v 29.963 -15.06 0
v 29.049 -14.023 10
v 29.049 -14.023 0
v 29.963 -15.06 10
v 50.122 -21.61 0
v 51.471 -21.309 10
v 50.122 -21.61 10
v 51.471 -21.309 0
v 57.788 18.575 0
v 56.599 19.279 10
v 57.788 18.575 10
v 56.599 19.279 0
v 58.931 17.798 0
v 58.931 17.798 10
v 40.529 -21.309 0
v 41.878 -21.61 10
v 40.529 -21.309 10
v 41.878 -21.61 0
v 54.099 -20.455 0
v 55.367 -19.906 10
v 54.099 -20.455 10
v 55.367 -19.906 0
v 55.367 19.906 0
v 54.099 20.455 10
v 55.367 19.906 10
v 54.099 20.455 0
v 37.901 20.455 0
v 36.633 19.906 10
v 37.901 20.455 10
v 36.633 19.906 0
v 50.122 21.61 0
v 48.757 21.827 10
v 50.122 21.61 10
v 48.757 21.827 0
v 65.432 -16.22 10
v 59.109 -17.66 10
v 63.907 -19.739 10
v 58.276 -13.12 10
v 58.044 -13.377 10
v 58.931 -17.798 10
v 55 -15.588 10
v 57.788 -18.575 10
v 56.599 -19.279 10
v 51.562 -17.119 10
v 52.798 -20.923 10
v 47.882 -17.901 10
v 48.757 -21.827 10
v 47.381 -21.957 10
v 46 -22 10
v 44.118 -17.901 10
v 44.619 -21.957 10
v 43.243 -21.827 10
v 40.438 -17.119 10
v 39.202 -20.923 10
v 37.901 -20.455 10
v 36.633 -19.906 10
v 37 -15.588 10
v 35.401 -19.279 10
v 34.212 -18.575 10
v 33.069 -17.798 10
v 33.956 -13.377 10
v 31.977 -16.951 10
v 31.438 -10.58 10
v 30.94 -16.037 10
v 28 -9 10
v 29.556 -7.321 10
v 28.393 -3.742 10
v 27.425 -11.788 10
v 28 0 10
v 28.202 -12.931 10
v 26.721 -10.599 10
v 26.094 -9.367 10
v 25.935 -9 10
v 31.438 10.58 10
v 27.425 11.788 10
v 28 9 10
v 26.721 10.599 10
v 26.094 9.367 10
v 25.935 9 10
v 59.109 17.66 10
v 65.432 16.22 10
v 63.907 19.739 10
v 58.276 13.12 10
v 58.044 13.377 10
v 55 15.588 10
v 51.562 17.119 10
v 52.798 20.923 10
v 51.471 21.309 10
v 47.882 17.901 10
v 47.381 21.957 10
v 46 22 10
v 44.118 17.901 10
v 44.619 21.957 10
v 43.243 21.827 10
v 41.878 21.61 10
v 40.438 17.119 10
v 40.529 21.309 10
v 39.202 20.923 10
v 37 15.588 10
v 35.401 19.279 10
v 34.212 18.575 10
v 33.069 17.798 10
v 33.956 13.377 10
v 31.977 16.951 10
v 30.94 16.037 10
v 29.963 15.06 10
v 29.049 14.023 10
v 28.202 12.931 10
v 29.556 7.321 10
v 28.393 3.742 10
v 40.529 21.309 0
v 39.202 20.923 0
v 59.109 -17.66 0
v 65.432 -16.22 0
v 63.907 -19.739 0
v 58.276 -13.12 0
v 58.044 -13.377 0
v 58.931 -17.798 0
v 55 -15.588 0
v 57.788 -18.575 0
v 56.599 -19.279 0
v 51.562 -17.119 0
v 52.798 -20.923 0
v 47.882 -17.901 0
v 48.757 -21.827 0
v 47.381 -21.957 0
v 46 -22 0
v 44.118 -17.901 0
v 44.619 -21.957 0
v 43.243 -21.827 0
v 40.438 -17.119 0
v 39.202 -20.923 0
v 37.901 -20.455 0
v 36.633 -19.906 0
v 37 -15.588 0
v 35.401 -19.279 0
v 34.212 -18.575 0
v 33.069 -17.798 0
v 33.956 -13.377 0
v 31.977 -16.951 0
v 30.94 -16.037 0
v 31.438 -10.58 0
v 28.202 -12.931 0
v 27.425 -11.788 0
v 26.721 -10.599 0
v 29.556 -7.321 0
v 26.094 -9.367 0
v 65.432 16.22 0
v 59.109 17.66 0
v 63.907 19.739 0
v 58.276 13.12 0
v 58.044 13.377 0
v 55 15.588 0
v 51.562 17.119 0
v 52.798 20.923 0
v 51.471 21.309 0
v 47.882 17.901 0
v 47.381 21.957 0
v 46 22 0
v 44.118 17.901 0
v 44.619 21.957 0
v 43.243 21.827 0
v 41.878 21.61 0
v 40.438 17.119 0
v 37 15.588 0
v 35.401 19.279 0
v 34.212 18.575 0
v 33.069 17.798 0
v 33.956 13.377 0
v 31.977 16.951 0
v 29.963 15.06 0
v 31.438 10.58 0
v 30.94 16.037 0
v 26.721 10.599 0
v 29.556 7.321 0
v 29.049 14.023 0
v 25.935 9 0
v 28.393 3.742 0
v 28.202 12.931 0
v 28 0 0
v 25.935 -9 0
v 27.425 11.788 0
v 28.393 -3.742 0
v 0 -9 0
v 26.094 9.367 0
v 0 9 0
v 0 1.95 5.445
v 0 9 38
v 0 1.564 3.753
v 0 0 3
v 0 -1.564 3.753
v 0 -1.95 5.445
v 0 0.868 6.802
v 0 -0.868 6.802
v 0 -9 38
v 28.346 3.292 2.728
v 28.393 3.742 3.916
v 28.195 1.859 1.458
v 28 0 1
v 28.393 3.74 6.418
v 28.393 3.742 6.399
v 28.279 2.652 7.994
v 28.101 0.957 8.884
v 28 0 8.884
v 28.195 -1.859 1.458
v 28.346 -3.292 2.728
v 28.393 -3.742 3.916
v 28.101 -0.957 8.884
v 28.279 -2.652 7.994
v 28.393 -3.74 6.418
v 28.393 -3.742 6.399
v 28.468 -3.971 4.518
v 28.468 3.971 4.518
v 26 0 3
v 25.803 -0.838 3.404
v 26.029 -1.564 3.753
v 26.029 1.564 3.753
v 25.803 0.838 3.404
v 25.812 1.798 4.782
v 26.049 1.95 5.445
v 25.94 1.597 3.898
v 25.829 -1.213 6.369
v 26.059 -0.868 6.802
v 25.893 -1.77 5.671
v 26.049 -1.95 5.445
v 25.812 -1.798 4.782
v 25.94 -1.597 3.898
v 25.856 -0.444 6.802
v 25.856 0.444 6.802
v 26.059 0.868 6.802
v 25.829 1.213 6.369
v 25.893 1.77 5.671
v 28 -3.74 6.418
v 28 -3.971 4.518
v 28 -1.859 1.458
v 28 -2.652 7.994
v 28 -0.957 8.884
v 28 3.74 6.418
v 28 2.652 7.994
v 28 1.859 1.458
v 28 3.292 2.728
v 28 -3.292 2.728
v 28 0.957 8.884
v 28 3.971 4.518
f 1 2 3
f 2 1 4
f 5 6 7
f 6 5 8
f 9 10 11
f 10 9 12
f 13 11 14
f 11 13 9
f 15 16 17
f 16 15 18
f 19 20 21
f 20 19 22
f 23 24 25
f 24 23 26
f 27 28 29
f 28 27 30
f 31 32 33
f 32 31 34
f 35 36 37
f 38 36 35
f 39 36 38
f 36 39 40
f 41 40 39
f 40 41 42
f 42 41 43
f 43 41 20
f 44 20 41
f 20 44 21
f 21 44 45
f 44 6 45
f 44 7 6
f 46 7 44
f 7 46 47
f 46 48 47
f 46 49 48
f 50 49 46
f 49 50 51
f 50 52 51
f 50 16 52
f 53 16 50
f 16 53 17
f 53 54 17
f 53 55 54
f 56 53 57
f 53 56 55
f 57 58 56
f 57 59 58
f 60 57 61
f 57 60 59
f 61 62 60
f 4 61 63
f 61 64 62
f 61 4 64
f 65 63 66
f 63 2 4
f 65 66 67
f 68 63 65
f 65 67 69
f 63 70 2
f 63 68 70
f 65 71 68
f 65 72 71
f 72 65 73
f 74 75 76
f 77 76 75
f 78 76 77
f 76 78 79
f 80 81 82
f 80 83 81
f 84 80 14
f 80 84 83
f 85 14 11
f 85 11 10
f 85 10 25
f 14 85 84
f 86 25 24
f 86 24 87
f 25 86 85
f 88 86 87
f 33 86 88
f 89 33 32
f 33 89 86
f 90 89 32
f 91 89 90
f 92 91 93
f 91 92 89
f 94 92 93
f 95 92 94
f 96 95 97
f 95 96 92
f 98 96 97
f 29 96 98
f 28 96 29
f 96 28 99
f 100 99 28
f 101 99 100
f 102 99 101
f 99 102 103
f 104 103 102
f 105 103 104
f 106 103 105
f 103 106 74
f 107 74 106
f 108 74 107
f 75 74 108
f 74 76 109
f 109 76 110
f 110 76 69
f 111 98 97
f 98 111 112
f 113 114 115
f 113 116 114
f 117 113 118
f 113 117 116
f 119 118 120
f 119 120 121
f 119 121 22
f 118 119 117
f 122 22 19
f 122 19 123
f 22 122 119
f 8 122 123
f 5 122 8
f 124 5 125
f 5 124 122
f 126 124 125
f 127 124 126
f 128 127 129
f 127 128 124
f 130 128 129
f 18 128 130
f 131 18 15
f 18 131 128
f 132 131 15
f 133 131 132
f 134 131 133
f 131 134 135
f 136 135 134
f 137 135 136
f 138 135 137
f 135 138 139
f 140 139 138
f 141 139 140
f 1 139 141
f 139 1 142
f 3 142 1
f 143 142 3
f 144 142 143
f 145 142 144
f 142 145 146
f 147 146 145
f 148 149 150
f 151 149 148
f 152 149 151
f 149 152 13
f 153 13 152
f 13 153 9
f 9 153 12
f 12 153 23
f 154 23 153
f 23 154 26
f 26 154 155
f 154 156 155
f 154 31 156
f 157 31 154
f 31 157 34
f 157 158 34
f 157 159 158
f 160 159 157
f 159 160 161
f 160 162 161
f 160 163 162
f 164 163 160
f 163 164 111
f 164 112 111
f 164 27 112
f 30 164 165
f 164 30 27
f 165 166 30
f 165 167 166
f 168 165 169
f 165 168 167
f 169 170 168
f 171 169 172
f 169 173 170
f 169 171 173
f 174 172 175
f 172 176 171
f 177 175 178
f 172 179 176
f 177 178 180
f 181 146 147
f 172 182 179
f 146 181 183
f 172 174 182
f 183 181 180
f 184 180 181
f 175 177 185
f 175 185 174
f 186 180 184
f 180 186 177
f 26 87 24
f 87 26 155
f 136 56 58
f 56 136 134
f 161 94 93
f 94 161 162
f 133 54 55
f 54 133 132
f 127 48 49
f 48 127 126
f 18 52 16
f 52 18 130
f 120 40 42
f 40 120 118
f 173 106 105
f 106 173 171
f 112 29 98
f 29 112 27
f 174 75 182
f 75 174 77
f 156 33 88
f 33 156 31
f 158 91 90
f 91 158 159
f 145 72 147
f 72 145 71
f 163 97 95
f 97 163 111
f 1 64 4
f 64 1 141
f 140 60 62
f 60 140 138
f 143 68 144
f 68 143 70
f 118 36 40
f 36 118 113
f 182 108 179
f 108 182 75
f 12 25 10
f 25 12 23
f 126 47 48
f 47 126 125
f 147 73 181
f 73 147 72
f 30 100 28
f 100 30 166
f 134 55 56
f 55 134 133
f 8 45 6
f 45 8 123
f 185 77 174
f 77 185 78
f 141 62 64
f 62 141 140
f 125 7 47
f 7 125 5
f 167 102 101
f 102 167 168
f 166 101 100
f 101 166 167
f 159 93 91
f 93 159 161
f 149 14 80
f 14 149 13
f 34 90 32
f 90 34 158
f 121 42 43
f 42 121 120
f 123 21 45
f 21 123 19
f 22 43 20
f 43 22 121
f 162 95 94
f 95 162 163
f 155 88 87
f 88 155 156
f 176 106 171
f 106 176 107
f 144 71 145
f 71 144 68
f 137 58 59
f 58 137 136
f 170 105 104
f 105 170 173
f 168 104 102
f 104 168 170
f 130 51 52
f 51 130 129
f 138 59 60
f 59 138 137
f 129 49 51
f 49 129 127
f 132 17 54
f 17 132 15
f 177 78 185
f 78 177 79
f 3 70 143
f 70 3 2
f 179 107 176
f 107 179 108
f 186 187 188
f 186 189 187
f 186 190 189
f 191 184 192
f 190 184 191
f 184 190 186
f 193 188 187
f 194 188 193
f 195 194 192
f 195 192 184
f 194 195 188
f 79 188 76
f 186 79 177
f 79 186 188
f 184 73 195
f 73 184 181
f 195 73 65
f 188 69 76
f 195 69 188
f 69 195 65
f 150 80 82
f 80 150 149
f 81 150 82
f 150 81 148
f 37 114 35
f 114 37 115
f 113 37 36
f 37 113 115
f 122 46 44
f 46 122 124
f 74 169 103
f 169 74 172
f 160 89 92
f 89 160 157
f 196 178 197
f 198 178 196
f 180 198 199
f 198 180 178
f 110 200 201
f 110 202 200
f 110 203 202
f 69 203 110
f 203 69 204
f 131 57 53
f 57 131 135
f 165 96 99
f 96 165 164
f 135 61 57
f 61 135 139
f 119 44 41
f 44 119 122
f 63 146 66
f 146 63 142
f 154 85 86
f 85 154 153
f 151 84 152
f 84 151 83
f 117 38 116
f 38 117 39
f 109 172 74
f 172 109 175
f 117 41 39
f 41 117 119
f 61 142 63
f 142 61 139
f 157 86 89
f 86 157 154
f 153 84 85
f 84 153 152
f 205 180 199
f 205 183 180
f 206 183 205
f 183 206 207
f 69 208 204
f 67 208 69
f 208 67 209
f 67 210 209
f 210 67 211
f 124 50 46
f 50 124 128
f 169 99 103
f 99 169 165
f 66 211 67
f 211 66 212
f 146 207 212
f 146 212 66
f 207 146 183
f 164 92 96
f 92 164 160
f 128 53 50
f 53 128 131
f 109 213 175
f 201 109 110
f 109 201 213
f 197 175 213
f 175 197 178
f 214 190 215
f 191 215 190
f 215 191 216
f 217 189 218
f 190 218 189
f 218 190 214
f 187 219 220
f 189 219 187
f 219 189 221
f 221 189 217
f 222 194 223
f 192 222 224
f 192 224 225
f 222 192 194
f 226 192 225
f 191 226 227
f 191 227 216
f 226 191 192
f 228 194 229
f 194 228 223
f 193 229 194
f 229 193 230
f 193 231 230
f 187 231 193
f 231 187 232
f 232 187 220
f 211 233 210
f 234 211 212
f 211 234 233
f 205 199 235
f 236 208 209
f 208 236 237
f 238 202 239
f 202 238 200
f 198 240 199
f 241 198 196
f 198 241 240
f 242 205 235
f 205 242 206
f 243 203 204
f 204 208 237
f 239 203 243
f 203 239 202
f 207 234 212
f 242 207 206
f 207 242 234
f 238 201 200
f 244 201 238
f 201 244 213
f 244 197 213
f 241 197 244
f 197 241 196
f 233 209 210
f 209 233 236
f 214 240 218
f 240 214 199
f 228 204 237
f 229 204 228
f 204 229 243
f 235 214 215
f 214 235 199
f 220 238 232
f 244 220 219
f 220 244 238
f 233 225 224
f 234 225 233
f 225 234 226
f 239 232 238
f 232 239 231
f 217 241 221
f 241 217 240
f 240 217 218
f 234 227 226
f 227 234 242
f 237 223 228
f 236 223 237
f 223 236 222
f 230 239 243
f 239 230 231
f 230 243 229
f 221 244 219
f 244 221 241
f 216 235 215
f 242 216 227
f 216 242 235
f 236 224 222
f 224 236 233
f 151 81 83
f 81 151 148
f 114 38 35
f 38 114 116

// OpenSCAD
holding_tude_diameter=36.;
tube_wall_distance=28.;
thickness=4.;
supported=true;
percent_opening=52.0/60.0;//degree
height=10.0;
screw_radius=2.0;
//internal parameters
screw_head_radius=screw_radius*2;
spacer_width=holding_tude_diameter*0.5;

difference(){
    union(){
   //around the tube
translate([tube_wall_distance+holding_tude_diameter*0.5,0,0])cylinder(h=height,r=holding_tude_diameter*0.5+thickness,$fn=100);
   //Spacer between the wall and the tube
translate([0,-spacer_width*0.5,0])cube([tube_wall_distance+holding_tude_diameter*0.5,
        spacer_width,
        height]);
   //Support for the spacer
polyhedron( points =  [
  [ 0,-spacer_width*0.5,height ],  //0
  [ tube_wall_distance,-spacer_width*0.5,height ],  //1
  [ 0,-spacer_width*0.5,height + tube_wall_distance],  //2
  [ 0,+spacer_width*0.5,height ],  //3
  [ tube_wall_distance,+spacer_width*0.5,height ],  //4
  [ 0,+spacer_width*0.5,height + tube_wall_distance ]], 
  faces =   [
  [0,2,1],  // bottom
  [1,2,5,4],  // front
  [3,4,5],  // top
  [0,1,4,3],  // right
  [2,0,3,5]] // left 
  );
    //opening lip 1
translate([tube_wall_distance,thickness*0.5,0])rotate ([00,00,atan(percent_opening/2)])translate([(holding_tude_diameter+thickness*1)*0.5,0,height*0.5])cube([holding_tude_diameter+thickness*1,
        thickness,
        height],center=true);
    //opening lip 2
translate([tube_wall_distance,-thickness*0.5,0])rotate ([00,00,-atan(percent_opening/2)])translate([(holding_tude_diameter+thickness*1)*0.5,0,height*0.5])cube([holding_tude_diameter+thickness*1,
        thickness,
        height],center=true);
    };
    union(){
//the holde for the tube
    translate([tube_wall_distance+holding_tude_diameter*0.5,0,0])cylinder(h=height,r=holding_tude_diameter*0.5);
//screw hole
    translate([0,0,height*0.5])rotate ([00,90,0])cylinder(h=tube_wall_distance+holding_tude_diameter*0.5,r=screw_radius);
//screw head cylindrical hole
    translate([tube_wall_distance,0,height*0.5])rotate ([00,90,0])cylinder(h=holding_tude_diameter*0.5,r=screw_head_radius);
//screw head conical hole
    translate([tube_wall_distance-screw_head_radius,0,height*0.5])rotate ([00,90,0])cylinder(h=screw_head_radius,r1=0,r2=screw_head_radius);
//the opening for the tube to enter the holder
    polyhedron( points =  [
  [  tube_wall_distance,0,0 ],  //0
  [ tube_wall_distance+holding_tude_diameter+thickness*2,  
  (holding_tude_diameter+thickness*2)*percent_opening/2,  0 ],  //1
  [ tube_wall_distance+holding_tude_diameter+thickness*2,
  -(holding_tude_diameter+thickness*2)*percent_opening/2,  0 ],  //2
  [ tube_wall_distance,0,  height ],  //3
  [ tube_wall_distance+holding_tude_diameter+thickness*2,
  (holding_tude_diameter+thickness*2)*percent_opening/2,  height ],  //4
  [ tube_wall_distance+holding_tude_diameter+thickness*2,
  -(holding_tude_diameter+thickness*2)*percent_opening/2,  height ]], 
  faces =   [
  [0,2,1],  // bottom
  [1,2,5,4],  // front
  [3,4,5],  // top
  [0,1,4,3],  // right
  [2,0,3,5]] // left 
  );}}
    
    //translate([tube_wall_distance+holding_tude_diameter*0.5,-holding_tude_diameter*(1-closure_percent)*0.5,0])cube([holding_tude_diameter*(1-closure_percent),holding_tude_diameter*(1-closure_percent),height]);
